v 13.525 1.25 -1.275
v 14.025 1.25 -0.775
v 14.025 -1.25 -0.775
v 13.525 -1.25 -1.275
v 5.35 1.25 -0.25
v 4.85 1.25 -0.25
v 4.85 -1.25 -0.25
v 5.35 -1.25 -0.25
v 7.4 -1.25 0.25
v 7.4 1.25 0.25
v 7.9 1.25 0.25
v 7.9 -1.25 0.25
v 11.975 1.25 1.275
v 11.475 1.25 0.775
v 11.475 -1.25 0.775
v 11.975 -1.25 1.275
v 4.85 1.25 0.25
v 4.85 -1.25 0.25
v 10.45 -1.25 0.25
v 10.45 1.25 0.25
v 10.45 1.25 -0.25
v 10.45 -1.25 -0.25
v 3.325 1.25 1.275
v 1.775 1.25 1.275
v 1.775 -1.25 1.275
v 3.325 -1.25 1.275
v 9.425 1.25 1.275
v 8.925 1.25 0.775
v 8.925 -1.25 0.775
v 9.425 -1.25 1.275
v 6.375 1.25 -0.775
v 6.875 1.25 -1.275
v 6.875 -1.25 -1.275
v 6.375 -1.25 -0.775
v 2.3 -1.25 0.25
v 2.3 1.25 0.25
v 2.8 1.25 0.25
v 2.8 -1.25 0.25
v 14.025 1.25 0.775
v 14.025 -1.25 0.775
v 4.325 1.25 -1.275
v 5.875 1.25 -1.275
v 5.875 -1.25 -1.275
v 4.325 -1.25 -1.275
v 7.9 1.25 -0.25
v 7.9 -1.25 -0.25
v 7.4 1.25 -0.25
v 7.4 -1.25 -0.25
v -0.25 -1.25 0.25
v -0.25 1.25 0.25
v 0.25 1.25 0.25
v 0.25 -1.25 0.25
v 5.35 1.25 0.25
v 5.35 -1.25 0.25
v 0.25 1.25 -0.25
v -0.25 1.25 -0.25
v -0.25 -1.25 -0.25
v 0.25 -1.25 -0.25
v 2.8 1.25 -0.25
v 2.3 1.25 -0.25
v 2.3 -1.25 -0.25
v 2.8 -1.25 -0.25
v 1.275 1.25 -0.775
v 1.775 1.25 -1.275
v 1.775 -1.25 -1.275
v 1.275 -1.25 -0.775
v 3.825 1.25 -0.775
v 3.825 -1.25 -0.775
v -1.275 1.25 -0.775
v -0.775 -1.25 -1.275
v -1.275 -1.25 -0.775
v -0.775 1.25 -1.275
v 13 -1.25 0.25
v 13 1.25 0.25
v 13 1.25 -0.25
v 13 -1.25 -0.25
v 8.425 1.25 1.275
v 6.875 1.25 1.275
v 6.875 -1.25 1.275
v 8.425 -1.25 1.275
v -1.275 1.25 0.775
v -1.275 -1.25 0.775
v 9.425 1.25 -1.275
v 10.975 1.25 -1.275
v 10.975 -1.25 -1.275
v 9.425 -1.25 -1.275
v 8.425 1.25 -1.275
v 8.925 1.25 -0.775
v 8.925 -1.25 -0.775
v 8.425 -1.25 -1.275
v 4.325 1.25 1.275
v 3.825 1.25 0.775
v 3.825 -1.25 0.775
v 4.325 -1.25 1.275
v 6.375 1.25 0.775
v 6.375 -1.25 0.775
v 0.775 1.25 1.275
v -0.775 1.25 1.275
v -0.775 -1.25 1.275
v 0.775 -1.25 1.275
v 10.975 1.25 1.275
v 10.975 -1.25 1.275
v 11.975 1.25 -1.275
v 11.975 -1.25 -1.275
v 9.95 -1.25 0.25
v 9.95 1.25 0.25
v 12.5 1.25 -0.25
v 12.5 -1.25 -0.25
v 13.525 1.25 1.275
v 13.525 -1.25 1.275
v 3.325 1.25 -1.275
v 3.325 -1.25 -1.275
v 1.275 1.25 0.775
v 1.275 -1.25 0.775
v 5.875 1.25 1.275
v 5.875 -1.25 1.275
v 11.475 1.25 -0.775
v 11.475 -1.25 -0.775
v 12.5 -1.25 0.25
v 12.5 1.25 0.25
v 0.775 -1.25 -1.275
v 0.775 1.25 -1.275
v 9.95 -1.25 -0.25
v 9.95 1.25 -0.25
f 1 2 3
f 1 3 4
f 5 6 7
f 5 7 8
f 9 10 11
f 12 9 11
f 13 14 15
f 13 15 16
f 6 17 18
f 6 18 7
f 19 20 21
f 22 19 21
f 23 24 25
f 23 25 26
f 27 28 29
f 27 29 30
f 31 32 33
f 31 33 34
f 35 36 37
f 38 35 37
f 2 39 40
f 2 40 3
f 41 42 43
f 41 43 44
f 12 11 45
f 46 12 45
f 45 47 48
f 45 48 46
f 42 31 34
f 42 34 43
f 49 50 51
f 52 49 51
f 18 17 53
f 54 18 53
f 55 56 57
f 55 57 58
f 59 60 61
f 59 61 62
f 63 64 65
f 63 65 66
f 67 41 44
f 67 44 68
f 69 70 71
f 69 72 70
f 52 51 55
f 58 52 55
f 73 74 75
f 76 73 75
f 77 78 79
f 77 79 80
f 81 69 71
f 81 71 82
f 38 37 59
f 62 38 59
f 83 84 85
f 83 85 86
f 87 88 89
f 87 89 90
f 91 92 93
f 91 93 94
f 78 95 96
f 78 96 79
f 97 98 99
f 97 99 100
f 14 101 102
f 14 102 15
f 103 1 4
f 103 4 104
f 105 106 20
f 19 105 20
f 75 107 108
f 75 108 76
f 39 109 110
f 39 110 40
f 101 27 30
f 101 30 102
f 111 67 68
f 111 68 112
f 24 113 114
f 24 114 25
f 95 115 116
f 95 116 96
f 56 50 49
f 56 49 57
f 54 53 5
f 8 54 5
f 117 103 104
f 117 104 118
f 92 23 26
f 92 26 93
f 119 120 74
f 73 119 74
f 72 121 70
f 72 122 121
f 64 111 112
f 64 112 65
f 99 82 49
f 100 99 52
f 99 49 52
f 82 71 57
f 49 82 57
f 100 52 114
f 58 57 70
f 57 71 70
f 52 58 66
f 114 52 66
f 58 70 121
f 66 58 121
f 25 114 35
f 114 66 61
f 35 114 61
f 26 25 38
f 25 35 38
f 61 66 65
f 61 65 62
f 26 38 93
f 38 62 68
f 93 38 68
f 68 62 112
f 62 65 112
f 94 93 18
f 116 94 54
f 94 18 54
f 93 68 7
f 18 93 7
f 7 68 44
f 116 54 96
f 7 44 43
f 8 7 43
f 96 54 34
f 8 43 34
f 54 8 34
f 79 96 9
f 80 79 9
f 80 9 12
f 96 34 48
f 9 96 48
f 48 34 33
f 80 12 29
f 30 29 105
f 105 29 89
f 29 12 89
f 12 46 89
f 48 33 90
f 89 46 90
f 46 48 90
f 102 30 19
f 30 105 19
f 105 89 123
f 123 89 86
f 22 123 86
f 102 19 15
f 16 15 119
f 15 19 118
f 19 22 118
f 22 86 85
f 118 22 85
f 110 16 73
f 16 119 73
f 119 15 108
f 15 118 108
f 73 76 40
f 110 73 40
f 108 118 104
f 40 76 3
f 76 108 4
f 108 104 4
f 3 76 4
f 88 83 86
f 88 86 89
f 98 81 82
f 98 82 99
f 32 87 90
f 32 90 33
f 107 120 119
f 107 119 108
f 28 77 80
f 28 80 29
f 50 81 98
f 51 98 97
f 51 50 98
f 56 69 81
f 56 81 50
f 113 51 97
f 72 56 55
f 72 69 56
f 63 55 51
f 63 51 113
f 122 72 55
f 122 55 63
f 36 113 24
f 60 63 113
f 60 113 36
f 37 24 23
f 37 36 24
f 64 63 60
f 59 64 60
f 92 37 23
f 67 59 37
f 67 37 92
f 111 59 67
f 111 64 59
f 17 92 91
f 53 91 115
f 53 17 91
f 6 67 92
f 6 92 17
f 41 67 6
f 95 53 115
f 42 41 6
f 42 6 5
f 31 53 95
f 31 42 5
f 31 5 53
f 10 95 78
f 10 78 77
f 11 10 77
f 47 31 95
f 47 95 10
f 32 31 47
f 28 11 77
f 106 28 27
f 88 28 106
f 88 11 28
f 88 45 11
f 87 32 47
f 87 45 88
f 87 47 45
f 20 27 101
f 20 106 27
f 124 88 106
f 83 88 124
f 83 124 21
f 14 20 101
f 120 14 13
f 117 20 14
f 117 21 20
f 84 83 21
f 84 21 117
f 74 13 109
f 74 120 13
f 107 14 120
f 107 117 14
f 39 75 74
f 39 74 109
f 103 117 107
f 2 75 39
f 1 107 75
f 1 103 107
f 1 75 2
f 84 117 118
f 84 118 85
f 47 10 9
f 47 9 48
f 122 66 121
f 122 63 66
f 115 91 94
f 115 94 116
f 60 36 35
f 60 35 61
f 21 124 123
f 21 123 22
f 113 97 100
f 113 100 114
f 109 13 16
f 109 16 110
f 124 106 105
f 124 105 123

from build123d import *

# Parameters (mm, degrees)
BOSS_EXTRUDE1_DEPTH = 1.25
SKETCH2_W           = 0.5
SKETCH2_H           = 0.5
CUT_EXTRUDE1_DEPTH  = 3.5


with BuildPart() as part:
    # Sketch1 → Boss-Extrude1 (new body, symmetric)
    with BuildSketch(Plane(origin=(0, 0, 0), x_dir=(1, 0, 0), z_dir=(0, 1, 0))):
        Polygon((-0.775, 1.275), (-1.275, 0.775), (-1.275, -0.775), (-0.775, -1.275), (0.775, -1.275), (1.275, -0.775), (1.775, -1.275), (3.325, -1.275), (3.825, -0.775), (4.325, -1.275), (5.875, -1.275), (6.375, -0.775), (6.875, -1.275), (8.425, -1.275), (8.925, -0.775), (9.425, -1.275), (10.975, -1.275), (11.475, -0.775), (11.975, -1.275), (13.525, -1.275), (14.025, -0.775), (14.025, 0.775), (13.525, 1.275), (11.975, 1.275), (11.475, 0.775), (10.975, 1.275), (9.425, 1.275), (8.925, 0.775), (8.425, 1.275), (6.875, 1.275), (6.375, 0.775), (5.875, 1.275), (4.325, 1.275), (3.825, 0.775), (3.325, 1.275), (1.775, 1.275), (1.275, 0.775), (0.775, 1.275), align=None)
    extrude(amount=BOSS_EXTRUDE1_DEPTH, both=True)

    # Sketch2 → Cut-Extrude1 (cut, through all)
    with BuildSketch(Plane(origin=(0, 1.25, 0), x_dir=(1, 0, 0), z_dir=(0, 1, 0))):
        with Locations((2.55, 0)):
            Rectangle(SKETCH2_W, SKETCH2_H)
        Rectangle(SKETCH2_W, SKETCH2_H)
        with Locations((5.1, 0)):
            Rectangle(SKETCH2_W, SKETCH2_H)
        with Locations((7.65, 0)):
            Rectangle(SKETCH2_W, SKETCH2_H)
        with Locations((10.2, 0)):
            Rectangle(SKETCH2_W, SKETCH2_H)
        with Locations((12.75, 0)):
            Rectangle(SKETCH2_W, SKETCH2_H)
    extrude(amount=-CUT_EXTRUDE1_DEPTH, mode=Mode.SUBTRACT)


solid = part.part
